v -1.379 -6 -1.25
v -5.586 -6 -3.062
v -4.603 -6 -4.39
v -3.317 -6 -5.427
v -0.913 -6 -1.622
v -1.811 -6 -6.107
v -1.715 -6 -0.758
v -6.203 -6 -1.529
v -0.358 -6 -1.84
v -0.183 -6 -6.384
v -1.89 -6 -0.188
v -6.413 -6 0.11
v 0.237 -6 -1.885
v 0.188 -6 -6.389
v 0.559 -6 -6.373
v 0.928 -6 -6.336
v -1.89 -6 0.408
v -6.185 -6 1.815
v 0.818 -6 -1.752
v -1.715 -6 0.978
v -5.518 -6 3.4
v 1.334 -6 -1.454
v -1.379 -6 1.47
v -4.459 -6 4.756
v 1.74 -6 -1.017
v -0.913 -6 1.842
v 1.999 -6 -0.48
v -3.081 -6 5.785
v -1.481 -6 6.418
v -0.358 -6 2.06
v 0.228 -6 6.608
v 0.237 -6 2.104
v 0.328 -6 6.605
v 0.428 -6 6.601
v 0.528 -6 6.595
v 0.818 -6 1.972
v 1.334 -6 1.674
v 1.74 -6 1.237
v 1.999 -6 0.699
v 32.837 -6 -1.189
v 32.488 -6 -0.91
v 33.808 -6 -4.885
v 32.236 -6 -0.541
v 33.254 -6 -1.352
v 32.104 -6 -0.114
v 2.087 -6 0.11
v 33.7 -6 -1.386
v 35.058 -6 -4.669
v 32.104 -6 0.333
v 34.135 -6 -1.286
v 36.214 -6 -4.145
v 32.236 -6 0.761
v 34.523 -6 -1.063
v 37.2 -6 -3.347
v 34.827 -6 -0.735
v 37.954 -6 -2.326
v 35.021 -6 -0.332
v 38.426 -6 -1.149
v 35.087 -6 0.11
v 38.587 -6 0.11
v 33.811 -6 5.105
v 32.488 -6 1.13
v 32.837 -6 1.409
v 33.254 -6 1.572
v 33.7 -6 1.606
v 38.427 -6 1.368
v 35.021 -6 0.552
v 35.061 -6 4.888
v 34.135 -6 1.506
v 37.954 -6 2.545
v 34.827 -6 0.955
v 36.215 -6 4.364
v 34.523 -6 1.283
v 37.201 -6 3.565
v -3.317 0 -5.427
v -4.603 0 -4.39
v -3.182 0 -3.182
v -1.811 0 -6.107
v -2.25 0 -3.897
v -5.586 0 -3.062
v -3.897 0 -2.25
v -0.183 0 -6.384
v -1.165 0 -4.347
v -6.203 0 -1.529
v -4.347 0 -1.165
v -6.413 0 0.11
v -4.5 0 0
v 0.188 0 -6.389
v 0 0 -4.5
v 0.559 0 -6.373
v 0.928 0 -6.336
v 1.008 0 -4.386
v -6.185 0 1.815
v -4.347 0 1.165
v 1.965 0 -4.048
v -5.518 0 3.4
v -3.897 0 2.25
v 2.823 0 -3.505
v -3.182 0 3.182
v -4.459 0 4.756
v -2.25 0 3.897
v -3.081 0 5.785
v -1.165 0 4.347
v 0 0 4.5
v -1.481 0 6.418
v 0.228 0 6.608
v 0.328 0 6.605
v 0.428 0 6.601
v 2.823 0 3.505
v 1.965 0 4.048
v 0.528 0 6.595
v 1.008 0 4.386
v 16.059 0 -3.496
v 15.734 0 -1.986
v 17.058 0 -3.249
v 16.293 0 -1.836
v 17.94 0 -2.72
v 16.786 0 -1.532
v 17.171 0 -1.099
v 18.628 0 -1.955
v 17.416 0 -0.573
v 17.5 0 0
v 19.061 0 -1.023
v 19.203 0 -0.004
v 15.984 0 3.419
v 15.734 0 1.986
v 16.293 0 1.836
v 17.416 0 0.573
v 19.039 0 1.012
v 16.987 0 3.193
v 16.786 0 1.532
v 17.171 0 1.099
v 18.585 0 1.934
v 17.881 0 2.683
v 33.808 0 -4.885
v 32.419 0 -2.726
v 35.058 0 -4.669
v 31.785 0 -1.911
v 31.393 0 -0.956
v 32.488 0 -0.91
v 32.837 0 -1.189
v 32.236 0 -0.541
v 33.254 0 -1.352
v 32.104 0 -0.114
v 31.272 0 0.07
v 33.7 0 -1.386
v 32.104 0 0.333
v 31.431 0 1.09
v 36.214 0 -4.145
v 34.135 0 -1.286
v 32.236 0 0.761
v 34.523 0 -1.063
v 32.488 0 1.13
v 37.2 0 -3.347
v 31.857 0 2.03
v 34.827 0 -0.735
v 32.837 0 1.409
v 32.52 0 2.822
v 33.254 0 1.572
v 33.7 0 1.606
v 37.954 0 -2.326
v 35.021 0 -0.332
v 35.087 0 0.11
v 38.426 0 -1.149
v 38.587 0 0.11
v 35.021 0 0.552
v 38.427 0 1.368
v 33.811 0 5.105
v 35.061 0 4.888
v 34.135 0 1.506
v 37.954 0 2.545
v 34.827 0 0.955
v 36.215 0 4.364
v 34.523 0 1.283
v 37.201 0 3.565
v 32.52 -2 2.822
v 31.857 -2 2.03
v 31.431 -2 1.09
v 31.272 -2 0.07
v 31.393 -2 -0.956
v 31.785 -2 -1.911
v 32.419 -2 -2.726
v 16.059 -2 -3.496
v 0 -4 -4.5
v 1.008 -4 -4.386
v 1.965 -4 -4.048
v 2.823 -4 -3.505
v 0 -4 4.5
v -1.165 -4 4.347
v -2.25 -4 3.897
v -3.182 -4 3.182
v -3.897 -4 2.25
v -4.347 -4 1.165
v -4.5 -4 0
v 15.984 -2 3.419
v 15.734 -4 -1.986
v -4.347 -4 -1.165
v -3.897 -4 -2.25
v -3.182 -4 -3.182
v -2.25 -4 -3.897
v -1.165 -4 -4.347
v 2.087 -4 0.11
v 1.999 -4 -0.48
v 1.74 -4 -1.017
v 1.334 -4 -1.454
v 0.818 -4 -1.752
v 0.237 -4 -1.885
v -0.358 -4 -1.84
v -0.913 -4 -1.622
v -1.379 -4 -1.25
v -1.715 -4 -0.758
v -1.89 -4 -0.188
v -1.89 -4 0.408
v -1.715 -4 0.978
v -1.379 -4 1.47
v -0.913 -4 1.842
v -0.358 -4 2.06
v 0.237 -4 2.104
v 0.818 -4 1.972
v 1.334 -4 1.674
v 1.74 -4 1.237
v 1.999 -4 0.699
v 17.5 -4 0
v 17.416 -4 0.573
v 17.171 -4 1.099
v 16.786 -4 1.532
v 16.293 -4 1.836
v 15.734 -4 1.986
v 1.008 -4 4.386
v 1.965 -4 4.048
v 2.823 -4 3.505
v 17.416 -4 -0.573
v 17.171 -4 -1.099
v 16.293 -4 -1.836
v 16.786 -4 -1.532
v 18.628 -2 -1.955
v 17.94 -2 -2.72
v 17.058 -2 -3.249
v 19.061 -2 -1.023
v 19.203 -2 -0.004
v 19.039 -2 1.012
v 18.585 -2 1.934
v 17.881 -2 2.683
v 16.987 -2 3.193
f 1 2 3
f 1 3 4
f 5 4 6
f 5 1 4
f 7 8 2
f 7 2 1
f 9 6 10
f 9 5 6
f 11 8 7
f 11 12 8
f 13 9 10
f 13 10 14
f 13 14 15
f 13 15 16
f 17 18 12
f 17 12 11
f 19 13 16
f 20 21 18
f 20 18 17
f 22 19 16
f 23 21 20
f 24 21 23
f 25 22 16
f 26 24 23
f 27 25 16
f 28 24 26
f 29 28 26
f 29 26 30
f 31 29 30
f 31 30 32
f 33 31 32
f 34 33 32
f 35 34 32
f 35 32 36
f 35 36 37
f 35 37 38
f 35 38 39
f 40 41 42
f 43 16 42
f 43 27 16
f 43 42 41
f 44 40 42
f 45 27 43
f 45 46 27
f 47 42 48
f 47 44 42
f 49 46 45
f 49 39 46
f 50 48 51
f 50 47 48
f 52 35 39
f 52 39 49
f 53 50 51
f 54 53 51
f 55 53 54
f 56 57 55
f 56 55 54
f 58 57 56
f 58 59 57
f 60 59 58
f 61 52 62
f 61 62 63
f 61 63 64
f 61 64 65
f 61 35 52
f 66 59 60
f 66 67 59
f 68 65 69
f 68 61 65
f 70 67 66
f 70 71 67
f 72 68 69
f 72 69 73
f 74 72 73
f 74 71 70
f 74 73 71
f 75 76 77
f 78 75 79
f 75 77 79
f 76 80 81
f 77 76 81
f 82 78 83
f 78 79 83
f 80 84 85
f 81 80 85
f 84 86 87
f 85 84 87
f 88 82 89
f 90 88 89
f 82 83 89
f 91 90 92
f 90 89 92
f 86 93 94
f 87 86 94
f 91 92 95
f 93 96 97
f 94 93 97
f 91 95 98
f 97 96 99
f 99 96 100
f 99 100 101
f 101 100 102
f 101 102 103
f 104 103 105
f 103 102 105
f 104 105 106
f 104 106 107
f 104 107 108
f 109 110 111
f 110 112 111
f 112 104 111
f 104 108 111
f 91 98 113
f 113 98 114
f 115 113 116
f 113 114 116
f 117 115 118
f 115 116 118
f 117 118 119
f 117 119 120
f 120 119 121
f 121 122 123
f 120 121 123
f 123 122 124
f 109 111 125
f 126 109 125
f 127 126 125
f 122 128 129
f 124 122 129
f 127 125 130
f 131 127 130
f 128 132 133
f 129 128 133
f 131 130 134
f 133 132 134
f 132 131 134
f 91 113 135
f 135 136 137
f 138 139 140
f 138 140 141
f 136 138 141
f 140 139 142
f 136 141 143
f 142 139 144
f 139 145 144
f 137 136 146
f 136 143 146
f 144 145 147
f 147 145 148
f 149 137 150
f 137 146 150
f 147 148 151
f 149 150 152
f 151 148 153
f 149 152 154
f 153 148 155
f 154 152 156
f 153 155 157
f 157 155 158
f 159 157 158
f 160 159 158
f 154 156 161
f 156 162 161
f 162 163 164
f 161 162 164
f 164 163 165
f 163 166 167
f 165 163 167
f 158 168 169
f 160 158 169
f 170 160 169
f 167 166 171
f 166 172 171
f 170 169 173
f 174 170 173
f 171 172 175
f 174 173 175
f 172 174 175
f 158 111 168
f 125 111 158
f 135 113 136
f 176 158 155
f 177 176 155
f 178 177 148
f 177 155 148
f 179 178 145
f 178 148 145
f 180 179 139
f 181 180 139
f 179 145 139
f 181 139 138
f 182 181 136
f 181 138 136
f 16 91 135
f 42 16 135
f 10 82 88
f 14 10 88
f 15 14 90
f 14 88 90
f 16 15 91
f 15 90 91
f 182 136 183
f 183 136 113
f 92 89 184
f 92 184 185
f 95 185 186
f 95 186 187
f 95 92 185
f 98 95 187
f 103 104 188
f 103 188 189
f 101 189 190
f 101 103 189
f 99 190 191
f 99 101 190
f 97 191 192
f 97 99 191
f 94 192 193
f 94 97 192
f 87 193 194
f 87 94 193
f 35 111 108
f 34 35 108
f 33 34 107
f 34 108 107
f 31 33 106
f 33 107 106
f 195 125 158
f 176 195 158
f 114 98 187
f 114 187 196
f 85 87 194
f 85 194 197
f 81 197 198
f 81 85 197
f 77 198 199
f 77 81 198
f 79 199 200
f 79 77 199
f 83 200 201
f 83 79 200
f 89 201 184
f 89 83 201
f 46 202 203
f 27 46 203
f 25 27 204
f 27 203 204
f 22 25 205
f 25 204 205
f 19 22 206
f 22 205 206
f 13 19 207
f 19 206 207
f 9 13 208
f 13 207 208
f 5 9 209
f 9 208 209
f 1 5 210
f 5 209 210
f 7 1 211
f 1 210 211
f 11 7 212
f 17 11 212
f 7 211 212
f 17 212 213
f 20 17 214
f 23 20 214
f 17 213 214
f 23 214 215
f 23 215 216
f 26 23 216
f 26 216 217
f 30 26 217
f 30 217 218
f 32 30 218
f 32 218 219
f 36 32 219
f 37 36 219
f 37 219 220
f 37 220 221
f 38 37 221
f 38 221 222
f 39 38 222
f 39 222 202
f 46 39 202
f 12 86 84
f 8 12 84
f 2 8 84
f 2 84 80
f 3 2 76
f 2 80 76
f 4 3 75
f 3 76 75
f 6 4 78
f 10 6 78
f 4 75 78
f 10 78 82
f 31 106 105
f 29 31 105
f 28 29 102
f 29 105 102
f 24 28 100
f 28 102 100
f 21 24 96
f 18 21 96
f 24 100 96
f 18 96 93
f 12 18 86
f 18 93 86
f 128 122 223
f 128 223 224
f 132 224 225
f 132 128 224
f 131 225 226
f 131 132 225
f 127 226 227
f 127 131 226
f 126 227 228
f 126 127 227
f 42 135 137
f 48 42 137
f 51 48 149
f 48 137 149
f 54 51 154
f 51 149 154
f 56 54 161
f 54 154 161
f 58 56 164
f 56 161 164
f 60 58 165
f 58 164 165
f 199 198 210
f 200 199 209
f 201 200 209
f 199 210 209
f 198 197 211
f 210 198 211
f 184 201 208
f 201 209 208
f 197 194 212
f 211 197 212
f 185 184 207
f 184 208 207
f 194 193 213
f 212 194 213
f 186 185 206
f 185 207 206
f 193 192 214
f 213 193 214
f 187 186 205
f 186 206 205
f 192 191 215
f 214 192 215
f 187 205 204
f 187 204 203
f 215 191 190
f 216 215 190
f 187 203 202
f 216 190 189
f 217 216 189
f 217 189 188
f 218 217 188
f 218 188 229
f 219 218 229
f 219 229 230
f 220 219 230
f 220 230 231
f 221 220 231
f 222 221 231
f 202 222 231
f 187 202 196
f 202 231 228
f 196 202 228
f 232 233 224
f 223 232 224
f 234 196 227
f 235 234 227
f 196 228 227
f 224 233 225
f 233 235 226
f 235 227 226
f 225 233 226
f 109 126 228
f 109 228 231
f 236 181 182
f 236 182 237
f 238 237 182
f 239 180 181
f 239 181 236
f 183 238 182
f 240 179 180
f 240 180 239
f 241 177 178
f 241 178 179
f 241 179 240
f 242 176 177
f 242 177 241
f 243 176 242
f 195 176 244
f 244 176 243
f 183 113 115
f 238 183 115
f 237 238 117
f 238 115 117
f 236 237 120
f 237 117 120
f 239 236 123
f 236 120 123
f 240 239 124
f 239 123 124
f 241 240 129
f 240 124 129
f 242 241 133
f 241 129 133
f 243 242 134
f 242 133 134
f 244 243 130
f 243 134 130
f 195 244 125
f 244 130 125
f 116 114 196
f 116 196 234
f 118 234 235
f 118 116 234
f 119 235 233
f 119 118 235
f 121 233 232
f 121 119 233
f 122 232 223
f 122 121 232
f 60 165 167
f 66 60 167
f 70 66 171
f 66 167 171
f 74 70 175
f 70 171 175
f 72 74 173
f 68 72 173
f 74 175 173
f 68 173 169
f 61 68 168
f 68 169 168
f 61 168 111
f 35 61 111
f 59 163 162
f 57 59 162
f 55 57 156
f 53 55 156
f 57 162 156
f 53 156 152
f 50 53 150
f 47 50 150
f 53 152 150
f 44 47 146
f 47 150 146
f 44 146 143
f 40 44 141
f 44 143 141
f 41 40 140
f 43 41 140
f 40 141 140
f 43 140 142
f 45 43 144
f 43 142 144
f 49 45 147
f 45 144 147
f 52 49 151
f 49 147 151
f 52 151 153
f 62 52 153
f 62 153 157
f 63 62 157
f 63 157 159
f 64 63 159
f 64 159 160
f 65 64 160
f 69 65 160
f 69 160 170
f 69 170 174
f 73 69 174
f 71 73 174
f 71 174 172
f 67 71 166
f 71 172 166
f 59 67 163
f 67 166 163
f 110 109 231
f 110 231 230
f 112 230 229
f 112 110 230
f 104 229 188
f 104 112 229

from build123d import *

# Parameters (mm, degrees)
F1_DEPTH = 6
F3_DEPTH = 4
F5_DEPTH = 2


with BuildPart() as f1:
    # F0 (on Front) → F1 (new body)
    with BuildSketch(Plane.XZ):
        with BuildLine():
            Line((0.5280444536, 6.5949463177), (0.2280896806, 6.6083750402))
            ThreePointArc((0.2280896806, 6.6083750402), (-4.4587573432, 4.7555534352), (-6.412563722, 0.1098970168))
            Line((-6.412563722, 0.1098970168), (-1.912563722, 0.1098970168))
            ThreePointArc((-1.912563722, 0.1098970168), (0.087436278, 2.1098970168), (2.087436278, 0.1098970168))
            Line((2.087436278, 0.1098970168), (6.587436278, 0.1098970168))
            ThreePointArc((6.587436278, 0.1098970168), (4.8368548288, 4.5475792304), (0.5280444536, 6.5949463177))
        make_face()
        with BuildLine():
            ThreePointArc((0.5280444536, 6.5949463177), (0.3781446168, 6.6033928905), (0.2280896806, 6.6083750402))
            Line((0.2280896806, 6.6083750402), (0.5280444536, 6.5949463177))
        make_face()
        with BuildLine():
            Line((-1.912563722, 0.1098970168), (-6.412563722, 0.1098970168))
            ThreePointArc((-6.412563722, 0.1098970168), (-4.6032413883, -4.3898299783), (-0.1825504819, -6.3844934203))
            Line((-0.1825504819, -6.3844934203), (0.92817218, -6.3355015856))
            ThreePointArc((0.92817218, -6.3355015856), (4.9718391772, -4.1787634173), (6.587436278, 0.1098970168))
            Line((6.587436278, 0.1098970168), (2.087436278, 0.1098970168))
            ThreePointArc((2.087436278, 0.1098970168), (0.087436278, -1.8901029832), (-1.912563722, 0.1098970168))
        make_face()
        with BuildLine():
            Line((33.8110580771, 5.1048938427), (0.5280444536, 6.5949463177))
            ThreePointArc((0.5280444536, 6.5949463177), (4.8368548288, 4.5475792304), (6.587436278, 0.1098970168))
            Line((6.587436278, 0.1098970168), (28.587436278, 0.1098970168))
            ThreePointArc((28.587436278, 0.1098970168), (30.1318689581, 3.7236283983), (33.8110580771, 5.1048938427))
        make_face()
        with BuildLine():
            Line((0.92817218, -6.3355015856), (-0.1825504819, -6.3844934203))
            ThreePointArc((-0.1825504819, -6.3844934203), (0.3738602571, -6.3837892479), (0.92817218, -6.3355015856))
        make_face()
        with BuildLine():
            Line((28.587436278, 0.1098970168), (6.587436278, 0.1098970168))
            ThreePointArc((6.587436278, 0.1098970168), (4.9718391772, -4.1787634173), (0.92817218, -6.3355015856))
            Line((0.92817218, -6.3355015856), (33.8077624157, -4.8852462637))
            ThreePointArc((33.8077624157, -4.8852462637), (30.1306770073, -3.5026942062), (28.587436278, 0.1098970168))
        make_face()
        with BuildLine():
            ThreePointArc((38.587436278, 0.1098970168), (37.2011676595, 3.5654643367), (33.8110580771, 5.1048938427))
            ThreePointArc((33.8110580771, 5.1048938427), (30.1318689581, 3.7236283983), (28.587436278, 0.1098970168))
            Line((28.587436278, 0.1098970168), (32.087436278, 0.1098970168))
            ThreePointArc((32.087436278, 0.1098970168), (33.587436278, 1.6098970168), (35.087436278, 0.1098970168))
            Line((35.087436278, 0.1098970168), (38.587436278, 0.1098970168))
        make_face()
        with BuildLine():
            Line((32.087436278, 0.1098970168), (28.587436278, 0.1098970168))
            ThreePointArc((28.587436278, 0.1098970168), (30.1306770073, -3.5026942062), (33.8077624157, -4.8852462637))
            ThreePointArc((33.8077624157, -4.8852462637), (37.200027501, -3.3468622539), (38.587436278, 0.1098970168))
            Line((38.587436278, 0.1098970168), (35.087436278, 0.1098970168))
            ThreePointArc((35.087436278, 0.1098970168), (33.587436278, -1.3901029832), (32.087436278, 0.1098970168))
        make_face()
    extrude(amount=F1_DEPTH)

    # F2 (on Front) → F3 (cut)
    with BuildSketch(Plane.XZ):
        with BuildLine():
            Line((2.8225806452, 0), (4.5, 0))
            ThreePointArc((4.5, 0), (4.0590400899, 1.9427283774), (2.8225806452, 3.5047166079))
            Line((2.8225806452, 3.5047166079), (2.8225806452, 0))
        make_face()
        with BuildLine():
            Line((13.5, 0), (4.5, 0))
            ThreePointArc((4.5, 0), (4.0590400899, -1.9427283774), (2.8225806452, -3.5047166079))
            Line((2.8225806452, -3.5047166079), (15.7336008924, -1.9863108073))
            ThreePointArc((15.7336008924, -1.9863108073), (14.1709405177, -1.4945236339), (13.5, 0))
        make_face()
        with BuildLine():
            ThreePointArc((2.8225806452, -3.5047166079), (4.0590400899, -1.9427283774), (4.5, 0))
            Line((4.5, 0), (2.8225806452, 0))
            Line((2.8225806452, 0), (2.8225806452, -3.5047166079))
        make_face()
        with BuildLine():
            ThreePointArc((2.8225806452, 3.5047166079), (4.0590400899, 1.9427283774), (4.5, 0))
            Line((4.5, 0), (13.5, 0))
            ThreePointArc((13.5, 0), (14.1709405177, 1.4945236339), (15.7336008924, 1.9863108073))
            Line((15.7336008924, 1.9863108073), (2.8225806452, 3.5047166079))
        make_face()
        with BuildLine():
            Line((2.8225806452, 0), (2.8225806452, 3.5047166079))
            ThreePointArc((2.8225806452, 3.5047166079), (1.496458363, 4.2438911824), (0, 4.5))
            Line((0, 4.5), (0, 0))
            Line((0, 0), (2.8225806452, 0))
        make_face()
        with BuildLine():
            ThreePointArc((0, -4.5), (1.496458363, -4.2438911824), (2.8225806452, -3.5047166079))
            Line((2.8225806452, -3.5047166079), (2.8225806452, 0))
            Line((2.8225806452, 0), (0, 0))
            Line((0, 0), (0, -4.5))
        make_face()
        with BuildLine():
            ThreePointArc((15.7336008924, 1.9863108073), (14.1709405177, 1.4945236339), (13.5, 0))
            ThreePointArc((13.5, 0), (14.1709405177, -1.4945236339), (15.7336008924, -1.9863108073))
            ThreePointArc((15.7336008924, -1.9863108073), (16.9945236339, -1.3290594823), (17.5, 0))
            ThreePointArc((17.5, 0), (16.9945236339, 1.3290594823), (15.7336008924, 1.9863108073))
        make_face()
        with BuildLine():
            Line((0, 0), (0, 4.5))
            ThreePointArc((0, 4.5), (-3.1819805153, 3.1819805153), (-4.5, 0))
            Line((-4.5, 0), (0, 0))
        make_face()
        with BuildLine():
            ThreePointArc((-4.5, 0), (-3.1819805153, -3.1819805153), (0, -4.5))
            Line((0, -4.5), (0, 0))
            Line((0, 0), (-4.5, 0))
        make_face()
    extrude(amount=F3_DEPTH, mode=Mode.SUBTRACT)

    # F4 (on face) → F5 (cut)
    with BuildSketch(Plane(origin=(0, 0, 0), x_dir=(-1, 0, 0), z_dir=(0, 1, 0))):
        with BuildLine():
            ThreePointArc((-16.0594756914, -3.4959212069), (-19.2027878035, -0.0038572282), (-15.9837236084, 3.418502714))
            Line((-15.9837236084, 3.418502714), (-32.5201968963, 2.8216355423))
            ThreePointArc((-32.5201968963, 2.8216355423), (-31.2720018674, 0.0697774052), (-32.4186347425, -2.7259241324))
            Line((-32.4186347425, -2.7259241324), (-16.0594756914, -3.4959212069))
        make_face()
    extrude(amount=-F5_DEPTH, mode=Mode.SUBTRACT)


solid = f1.part
